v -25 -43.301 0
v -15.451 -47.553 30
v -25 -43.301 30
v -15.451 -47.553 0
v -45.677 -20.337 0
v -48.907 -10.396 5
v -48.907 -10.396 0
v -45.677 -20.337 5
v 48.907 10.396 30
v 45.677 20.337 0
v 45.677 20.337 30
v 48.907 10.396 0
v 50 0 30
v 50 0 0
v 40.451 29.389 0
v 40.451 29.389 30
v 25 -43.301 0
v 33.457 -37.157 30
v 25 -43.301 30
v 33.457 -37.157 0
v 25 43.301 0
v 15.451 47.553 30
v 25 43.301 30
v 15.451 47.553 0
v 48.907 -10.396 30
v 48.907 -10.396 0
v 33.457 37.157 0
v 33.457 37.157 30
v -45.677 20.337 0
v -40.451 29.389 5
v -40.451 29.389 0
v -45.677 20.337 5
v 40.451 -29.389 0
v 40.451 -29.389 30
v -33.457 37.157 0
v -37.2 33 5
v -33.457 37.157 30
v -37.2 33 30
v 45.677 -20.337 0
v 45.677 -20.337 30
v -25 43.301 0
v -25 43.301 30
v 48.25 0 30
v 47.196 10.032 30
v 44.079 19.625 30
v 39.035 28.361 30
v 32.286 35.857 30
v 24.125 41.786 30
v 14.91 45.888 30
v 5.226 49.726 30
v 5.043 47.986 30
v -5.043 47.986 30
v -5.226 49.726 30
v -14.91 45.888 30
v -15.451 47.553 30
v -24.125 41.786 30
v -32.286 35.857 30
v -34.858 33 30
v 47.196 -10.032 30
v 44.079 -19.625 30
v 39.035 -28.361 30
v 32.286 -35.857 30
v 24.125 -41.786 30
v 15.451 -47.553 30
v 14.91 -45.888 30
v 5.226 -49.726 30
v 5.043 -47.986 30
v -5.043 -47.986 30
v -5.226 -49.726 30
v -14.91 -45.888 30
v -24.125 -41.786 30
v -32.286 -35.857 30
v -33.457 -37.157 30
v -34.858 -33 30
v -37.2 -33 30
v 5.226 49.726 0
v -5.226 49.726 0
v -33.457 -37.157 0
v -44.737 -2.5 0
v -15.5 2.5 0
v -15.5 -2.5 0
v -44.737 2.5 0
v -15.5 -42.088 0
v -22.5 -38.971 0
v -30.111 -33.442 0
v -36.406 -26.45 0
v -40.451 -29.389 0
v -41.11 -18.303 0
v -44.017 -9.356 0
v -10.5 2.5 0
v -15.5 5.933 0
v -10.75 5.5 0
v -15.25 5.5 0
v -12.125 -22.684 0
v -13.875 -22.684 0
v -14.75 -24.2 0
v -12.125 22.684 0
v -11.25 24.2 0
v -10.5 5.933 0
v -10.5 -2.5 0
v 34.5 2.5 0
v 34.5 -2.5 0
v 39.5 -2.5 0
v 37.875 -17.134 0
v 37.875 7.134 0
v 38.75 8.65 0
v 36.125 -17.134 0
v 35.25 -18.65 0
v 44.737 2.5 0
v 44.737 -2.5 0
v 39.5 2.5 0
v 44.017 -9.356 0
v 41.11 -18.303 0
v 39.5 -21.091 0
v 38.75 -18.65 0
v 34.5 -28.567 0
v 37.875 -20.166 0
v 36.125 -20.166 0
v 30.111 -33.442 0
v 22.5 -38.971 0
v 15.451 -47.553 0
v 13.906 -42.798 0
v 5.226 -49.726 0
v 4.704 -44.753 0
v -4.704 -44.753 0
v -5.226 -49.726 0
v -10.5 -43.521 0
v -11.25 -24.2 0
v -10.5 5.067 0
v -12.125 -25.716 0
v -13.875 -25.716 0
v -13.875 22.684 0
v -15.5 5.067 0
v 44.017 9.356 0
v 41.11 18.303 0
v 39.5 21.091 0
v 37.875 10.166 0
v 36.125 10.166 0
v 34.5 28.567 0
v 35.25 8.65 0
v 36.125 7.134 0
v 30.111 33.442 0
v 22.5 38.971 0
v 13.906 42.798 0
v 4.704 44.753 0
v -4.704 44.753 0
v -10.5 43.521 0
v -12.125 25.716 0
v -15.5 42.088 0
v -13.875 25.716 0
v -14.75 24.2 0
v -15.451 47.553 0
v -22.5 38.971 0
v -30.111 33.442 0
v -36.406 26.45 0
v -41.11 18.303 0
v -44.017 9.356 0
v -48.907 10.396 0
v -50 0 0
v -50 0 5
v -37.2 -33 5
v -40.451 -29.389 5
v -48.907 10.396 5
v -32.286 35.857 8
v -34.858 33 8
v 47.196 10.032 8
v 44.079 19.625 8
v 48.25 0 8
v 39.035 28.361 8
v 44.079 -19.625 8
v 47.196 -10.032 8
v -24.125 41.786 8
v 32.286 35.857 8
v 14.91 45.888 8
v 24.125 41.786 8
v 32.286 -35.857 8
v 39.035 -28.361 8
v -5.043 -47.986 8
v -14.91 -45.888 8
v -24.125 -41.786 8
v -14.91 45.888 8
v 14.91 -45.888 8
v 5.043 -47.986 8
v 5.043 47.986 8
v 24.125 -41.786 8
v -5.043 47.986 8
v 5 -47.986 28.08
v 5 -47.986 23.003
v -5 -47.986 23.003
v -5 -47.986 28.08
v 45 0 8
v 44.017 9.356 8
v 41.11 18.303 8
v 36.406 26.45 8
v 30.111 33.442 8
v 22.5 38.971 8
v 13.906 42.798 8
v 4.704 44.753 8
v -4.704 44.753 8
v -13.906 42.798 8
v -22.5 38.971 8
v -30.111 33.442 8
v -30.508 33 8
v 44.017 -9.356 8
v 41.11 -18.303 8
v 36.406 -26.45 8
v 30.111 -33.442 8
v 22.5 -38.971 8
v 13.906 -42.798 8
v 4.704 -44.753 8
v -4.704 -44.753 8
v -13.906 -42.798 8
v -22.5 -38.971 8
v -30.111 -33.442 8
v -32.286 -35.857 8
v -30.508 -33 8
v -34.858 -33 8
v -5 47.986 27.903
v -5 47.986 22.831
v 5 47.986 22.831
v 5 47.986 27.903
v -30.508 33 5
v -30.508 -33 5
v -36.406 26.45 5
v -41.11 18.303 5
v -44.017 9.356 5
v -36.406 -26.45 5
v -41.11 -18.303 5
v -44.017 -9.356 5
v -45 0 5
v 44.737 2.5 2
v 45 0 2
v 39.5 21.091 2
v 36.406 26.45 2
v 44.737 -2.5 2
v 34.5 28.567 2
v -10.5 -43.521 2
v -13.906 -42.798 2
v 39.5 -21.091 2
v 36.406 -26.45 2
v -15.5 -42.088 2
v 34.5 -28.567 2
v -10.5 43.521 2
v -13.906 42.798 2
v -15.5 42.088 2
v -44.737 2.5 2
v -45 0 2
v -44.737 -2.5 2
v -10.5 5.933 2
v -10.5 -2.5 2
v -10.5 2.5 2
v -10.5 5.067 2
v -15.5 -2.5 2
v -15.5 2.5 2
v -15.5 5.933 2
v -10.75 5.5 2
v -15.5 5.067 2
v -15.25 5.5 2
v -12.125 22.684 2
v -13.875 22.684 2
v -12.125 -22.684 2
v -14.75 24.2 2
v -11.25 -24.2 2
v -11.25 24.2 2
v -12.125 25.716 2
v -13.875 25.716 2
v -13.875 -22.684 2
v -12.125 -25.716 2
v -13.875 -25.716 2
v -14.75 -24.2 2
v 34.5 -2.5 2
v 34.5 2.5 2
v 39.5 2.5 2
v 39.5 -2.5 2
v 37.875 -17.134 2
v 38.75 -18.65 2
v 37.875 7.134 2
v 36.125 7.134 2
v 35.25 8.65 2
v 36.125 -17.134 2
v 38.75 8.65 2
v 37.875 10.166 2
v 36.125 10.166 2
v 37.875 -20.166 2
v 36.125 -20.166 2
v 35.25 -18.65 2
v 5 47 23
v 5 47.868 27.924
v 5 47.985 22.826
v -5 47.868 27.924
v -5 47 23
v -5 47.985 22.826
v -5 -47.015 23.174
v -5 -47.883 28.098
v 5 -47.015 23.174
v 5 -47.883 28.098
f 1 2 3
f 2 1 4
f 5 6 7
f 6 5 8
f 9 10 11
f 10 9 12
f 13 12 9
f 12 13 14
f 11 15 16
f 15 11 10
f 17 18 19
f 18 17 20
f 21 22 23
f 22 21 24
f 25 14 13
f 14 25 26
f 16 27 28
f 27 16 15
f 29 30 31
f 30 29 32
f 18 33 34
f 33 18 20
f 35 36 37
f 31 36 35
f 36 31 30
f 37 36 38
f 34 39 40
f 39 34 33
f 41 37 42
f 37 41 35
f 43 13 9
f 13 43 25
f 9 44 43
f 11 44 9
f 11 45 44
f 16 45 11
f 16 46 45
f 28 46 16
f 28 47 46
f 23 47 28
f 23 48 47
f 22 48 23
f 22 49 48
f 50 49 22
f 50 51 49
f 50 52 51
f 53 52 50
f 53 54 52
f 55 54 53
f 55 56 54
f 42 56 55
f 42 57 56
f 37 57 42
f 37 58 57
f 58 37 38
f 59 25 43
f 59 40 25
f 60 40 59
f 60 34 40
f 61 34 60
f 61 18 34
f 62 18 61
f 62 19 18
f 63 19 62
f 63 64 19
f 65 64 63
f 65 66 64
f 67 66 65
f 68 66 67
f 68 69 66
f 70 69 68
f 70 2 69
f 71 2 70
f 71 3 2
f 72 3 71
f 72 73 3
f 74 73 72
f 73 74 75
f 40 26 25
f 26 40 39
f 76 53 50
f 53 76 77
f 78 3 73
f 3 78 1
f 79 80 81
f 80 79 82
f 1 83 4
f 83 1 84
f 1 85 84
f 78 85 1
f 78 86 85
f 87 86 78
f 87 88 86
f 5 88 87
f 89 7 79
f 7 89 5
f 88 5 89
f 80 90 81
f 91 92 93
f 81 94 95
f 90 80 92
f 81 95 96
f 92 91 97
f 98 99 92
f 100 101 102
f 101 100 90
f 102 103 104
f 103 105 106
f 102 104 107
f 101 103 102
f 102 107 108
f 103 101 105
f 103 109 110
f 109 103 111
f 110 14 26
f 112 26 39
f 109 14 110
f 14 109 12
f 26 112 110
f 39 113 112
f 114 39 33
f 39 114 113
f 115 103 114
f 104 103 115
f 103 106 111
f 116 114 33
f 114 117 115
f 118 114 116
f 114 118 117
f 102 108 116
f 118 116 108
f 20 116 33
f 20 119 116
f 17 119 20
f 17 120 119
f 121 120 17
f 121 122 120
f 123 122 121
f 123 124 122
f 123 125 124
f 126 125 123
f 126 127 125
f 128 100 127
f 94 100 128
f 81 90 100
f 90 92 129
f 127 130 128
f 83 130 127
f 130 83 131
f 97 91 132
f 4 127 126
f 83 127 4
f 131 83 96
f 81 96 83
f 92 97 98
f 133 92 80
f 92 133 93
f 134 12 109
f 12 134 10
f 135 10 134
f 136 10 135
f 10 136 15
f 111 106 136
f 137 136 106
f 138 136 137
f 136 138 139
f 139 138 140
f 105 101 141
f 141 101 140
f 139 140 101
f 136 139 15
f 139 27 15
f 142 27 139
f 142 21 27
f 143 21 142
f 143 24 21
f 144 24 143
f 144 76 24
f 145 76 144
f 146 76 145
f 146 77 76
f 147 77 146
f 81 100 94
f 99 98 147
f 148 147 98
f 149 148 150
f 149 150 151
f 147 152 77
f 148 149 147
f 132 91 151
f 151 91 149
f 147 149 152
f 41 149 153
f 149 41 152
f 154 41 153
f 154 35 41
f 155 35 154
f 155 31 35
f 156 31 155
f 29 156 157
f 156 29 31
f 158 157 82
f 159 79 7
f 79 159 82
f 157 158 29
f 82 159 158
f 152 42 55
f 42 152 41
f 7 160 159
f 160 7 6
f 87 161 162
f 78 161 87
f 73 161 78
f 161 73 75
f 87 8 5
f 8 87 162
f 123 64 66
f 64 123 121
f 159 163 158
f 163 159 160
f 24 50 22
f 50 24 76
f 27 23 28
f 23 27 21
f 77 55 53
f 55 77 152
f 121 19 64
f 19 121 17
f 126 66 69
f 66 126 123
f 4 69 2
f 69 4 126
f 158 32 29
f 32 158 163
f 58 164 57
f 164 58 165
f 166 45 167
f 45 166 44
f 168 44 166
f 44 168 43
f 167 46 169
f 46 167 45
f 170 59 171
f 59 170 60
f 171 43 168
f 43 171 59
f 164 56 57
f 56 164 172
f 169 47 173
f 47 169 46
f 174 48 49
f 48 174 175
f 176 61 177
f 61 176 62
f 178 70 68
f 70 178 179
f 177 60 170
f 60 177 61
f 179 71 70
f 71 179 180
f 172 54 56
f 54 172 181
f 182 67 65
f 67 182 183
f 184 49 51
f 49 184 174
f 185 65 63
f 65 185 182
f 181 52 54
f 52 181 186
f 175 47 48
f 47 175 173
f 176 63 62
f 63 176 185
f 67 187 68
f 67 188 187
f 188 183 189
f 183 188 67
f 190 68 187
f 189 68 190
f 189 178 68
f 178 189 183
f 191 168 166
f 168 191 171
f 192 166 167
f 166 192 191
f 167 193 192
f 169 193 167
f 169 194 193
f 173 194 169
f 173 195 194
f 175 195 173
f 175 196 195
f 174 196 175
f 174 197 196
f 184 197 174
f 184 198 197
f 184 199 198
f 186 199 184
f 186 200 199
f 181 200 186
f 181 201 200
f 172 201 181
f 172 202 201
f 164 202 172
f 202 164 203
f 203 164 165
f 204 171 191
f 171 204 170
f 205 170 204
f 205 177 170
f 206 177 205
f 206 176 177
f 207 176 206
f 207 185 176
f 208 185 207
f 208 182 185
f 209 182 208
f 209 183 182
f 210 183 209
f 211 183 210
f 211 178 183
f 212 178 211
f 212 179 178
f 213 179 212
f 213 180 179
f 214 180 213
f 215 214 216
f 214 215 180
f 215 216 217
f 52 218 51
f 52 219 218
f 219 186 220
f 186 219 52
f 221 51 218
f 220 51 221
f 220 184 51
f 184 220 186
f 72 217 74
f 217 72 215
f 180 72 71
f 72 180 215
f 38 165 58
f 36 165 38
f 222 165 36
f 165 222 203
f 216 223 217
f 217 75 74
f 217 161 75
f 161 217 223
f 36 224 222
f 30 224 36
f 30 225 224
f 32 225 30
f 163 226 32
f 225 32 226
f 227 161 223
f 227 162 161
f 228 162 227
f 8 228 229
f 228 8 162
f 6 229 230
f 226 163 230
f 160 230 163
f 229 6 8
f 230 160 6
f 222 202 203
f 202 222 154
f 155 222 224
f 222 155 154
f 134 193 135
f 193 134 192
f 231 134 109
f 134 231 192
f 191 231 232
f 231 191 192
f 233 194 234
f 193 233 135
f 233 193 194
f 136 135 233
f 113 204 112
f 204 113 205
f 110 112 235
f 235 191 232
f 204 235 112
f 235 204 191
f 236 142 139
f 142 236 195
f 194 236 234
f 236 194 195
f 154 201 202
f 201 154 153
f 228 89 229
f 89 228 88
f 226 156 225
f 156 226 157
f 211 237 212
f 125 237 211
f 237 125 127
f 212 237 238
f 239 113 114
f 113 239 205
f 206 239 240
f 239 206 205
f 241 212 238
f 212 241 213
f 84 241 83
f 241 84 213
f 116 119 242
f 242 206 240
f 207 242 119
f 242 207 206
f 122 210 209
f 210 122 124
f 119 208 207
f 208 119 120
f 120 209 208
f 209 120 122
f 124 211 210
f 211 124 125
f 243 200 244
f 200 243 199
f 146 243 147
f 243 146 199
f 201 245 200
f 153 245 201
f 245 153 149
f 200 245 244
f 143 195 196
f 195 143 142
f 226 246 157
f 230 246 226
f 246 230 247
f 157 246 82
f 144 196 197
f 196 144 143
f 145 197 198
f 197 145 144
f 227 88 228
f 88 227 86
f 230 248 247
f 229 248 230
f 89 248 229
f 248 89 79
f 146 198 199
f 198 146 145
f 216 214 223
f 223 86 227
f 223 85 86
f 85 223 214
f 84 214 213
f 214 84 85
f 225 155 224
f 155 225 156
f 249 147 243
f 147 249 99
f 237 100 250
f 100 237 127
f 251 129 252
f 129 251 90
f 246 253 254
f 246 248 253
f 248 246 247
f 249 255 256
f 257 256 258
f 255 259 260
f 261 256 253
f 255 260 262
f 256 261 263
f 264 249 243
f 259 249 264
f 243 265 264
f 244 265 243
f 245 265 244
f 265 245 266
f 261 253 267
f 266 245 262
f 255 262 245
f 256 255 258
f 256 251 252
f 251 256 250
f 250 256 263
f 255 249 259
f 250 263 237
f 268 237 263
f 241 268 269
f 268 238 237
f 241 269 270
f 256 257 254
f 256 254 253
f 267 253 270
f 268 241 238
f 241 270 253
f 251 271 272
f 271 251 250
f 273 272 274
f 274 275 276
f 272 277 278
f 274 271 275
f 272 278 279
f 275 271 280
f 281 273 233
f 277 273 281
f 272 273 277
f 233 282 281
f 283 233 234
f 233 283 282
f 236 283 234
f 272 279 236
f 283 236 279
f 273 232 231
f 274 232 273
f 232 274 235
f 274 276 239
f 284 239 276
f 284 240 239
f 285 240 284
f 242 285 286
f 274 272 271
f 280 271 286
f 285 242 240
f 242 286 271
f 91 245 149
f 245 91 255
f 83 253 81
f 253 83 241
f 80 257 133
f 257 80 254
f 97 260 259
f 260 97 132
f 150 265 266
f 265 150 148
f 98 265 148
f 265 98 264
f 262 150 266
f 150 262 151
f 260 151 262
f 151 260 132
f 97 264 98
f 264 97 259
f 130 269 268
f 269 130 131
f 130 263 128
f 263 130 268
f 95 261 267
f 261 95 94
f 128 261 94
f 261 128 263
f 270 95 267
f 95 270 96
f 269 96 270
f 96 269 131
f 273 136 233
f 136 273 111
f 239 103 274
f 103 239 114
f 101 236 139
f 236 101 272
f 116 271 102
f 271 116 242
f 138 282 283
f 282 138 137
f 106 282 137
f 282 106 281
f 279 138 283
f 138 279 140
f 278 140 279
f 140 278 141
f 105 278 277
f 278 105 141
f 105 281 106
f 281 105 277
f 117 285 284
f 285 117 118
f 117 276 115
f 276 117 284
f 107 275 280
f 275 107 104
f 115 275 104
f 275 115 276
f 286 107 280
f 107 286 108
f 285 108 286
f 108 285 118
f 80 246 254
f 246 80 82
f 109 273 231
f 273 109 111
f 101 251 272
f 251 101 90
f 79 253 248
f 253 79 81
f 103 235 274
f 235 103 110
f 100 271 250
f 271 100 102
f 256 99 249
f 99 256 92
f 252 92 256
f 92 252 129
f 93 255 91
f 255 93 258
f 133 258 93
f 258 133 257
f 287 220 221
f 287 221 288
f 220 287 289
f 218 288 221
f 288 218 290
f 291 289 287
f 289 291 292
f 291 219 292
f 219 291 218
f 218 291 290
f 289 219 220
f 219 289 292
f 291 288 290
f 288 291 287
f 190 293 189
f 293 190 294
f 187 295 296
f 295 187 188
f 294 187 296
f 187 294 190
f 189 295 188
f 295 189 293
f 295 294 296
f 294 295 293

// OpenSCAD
// if 0 - all parts, if 1 base if 2 ardunio mount
parts = 1;

if (parts != 2){
union(){
  difference(){
    // Main Body
    cylinder(r=50,h=30);
    // Big Hole
    translate([0,0,8]){
      cylinder(r=48.25, h=30);
    }
    translate([0,0,5]){
      intersection(){
        //Cutout the 'notch'
        rotate([0,0,90]){
          translate([-33,0,0]){
            cube([66,100,30]);
          }
        }
      }
    }
    //keep top circumfrance thin
    cylinder(r=45,h=30);
  }
  translate([-47.5,-2.5,0]){
    difference(){
      union(){
        cube([95,5,2]);
        translate([47.5-13,2.5,1]){
          //cube([20,20,2], center = true);
          difference(){
            cube([5,90,2], center = true);
            translate([0,24.2,-1]){
              cylinder(r=1.75,h=2);
            }
            translate([0,-24.2,-1]){
              cylinder(r=1.75,h=2);
            }
         }
         translate([50,0,0]){
           difference(){
             cube([5,60,2],center= true);
             translate([0,8.65,-1]){
               cylinder(r=1.75,h=2);
             }
             translate([0,-18.65,-1]){
               cylinder(r=1.75,h=2);
             }
           }
         }
       }
     }
     translate([47.5-13,2.5,0]){
       translate([4,0,0]){
         //cylinder(r=2.5,h=2);
         translate([0,5.5,0]){
           cylinder(r=1.75,h=2);
         }
       }
       translate([-4,0,0]){
         //cylinder(r=2.5,h=2);
         translate([0,5.5,0]){
           cylinder(r=1.75,h=2);
         }
       }
     }
   }
  }
  translate([-5,47,15 + 8]){
    rotate([-10,0,0]){
      cube([10,1,5]);
    }
  }
  translate([-5,-48,15 + 8]){
    rotate([10,0,0]){
      cube([10,1,5]);
    }
  }
}
}
if (parts != 1){
  difference(){
  union(){
  translate([-47.5,-2.5,-1]){
    difference(){
      union(){
        translate([47.5-13,2.5,1]){
          difference(){
            union(){
				  translate([-2,-27,0]){
                cube([4,54,38]);
              }
				  translate([0,24.2,0]){
                cylinder(r=4,h=50);
              }
              translate([0,-24.2,0]){
                cylinder(r=4,h=50);
              }
            }
            translate([0,24.2,0]){
              cylinder(r=1.75,h=80);
            }
            translate([0,-24.2,0]){
              cylinder(r=1.75,h=80);
            }
         }
         translate([50,0,0]){
           difference(){
             union(){
               translate([-2,-27,0]){
                 cube([4,54,38]);
               }
               translate([0,8.65,0]){
                 cylinder(r=4,h=50);
               }
               translate([0,-18.65,0]){
                 cylinder(r=4,h=50);
               }
             }
             translate([0,8.65,0]){
               cylinder(r=1.75,h=80);
             }
             translate([0,-18.65,0]){
               cylinder(r=1.75,h=80);
             }
           }
         }
         translate([2,23,0]){
           cube([50,4,38]);
         }
         translate([2,-27,0]){
           cube([50,4,38]);
         }
       }
     }
   }
 }
difference(){
translate([10,0,0]){
  rotate([90,0,0]){
    translate([0,2,-27]){
      translate([23/2,0,0]){
        cylinder(r=4, h=5);
      }
      translate([-23/2,0,0]){
        cylinder(r=4, h=5);
      }
      translate([23/2,30,0]){
        cylinder(r=4, h=5);
      }
      translate([-23/2,30,0]){
        cylinder(r=4, h=5);
      }
    }
    translate([0,2,22]){
      translate([23/2,0,0]){
        cylinder(r=4, h=5);
      }
      translate([-23/2,0,0]){
        cylinder(r=4, h=5);
      }
      translate([23/2,30,0]){
        cylinder(r=4, h=5);
      }
      translate([-23/2,30,0]){
        cylinder(r=4, h=5);
      }
    }
  }
}
translate([-50,-50,-2]){
cube([100,100,2]);
}
}
}
translate([10,0,0]){
rotate([90,0,0]){
translate([0,2,-50]){
translate([23/2,0,0]){
cylinder(r=1.75, h=100);
}
translate([-23/2,0,0]){
cylinder(r=1.75, h=100);
}
translate([23/2,30,0]){
cylinder(r=1.75, h=100);
}
translate([-23/2,30,0]){
cylinder(r=1.75, h=100);
}
}
}
}
}
}
